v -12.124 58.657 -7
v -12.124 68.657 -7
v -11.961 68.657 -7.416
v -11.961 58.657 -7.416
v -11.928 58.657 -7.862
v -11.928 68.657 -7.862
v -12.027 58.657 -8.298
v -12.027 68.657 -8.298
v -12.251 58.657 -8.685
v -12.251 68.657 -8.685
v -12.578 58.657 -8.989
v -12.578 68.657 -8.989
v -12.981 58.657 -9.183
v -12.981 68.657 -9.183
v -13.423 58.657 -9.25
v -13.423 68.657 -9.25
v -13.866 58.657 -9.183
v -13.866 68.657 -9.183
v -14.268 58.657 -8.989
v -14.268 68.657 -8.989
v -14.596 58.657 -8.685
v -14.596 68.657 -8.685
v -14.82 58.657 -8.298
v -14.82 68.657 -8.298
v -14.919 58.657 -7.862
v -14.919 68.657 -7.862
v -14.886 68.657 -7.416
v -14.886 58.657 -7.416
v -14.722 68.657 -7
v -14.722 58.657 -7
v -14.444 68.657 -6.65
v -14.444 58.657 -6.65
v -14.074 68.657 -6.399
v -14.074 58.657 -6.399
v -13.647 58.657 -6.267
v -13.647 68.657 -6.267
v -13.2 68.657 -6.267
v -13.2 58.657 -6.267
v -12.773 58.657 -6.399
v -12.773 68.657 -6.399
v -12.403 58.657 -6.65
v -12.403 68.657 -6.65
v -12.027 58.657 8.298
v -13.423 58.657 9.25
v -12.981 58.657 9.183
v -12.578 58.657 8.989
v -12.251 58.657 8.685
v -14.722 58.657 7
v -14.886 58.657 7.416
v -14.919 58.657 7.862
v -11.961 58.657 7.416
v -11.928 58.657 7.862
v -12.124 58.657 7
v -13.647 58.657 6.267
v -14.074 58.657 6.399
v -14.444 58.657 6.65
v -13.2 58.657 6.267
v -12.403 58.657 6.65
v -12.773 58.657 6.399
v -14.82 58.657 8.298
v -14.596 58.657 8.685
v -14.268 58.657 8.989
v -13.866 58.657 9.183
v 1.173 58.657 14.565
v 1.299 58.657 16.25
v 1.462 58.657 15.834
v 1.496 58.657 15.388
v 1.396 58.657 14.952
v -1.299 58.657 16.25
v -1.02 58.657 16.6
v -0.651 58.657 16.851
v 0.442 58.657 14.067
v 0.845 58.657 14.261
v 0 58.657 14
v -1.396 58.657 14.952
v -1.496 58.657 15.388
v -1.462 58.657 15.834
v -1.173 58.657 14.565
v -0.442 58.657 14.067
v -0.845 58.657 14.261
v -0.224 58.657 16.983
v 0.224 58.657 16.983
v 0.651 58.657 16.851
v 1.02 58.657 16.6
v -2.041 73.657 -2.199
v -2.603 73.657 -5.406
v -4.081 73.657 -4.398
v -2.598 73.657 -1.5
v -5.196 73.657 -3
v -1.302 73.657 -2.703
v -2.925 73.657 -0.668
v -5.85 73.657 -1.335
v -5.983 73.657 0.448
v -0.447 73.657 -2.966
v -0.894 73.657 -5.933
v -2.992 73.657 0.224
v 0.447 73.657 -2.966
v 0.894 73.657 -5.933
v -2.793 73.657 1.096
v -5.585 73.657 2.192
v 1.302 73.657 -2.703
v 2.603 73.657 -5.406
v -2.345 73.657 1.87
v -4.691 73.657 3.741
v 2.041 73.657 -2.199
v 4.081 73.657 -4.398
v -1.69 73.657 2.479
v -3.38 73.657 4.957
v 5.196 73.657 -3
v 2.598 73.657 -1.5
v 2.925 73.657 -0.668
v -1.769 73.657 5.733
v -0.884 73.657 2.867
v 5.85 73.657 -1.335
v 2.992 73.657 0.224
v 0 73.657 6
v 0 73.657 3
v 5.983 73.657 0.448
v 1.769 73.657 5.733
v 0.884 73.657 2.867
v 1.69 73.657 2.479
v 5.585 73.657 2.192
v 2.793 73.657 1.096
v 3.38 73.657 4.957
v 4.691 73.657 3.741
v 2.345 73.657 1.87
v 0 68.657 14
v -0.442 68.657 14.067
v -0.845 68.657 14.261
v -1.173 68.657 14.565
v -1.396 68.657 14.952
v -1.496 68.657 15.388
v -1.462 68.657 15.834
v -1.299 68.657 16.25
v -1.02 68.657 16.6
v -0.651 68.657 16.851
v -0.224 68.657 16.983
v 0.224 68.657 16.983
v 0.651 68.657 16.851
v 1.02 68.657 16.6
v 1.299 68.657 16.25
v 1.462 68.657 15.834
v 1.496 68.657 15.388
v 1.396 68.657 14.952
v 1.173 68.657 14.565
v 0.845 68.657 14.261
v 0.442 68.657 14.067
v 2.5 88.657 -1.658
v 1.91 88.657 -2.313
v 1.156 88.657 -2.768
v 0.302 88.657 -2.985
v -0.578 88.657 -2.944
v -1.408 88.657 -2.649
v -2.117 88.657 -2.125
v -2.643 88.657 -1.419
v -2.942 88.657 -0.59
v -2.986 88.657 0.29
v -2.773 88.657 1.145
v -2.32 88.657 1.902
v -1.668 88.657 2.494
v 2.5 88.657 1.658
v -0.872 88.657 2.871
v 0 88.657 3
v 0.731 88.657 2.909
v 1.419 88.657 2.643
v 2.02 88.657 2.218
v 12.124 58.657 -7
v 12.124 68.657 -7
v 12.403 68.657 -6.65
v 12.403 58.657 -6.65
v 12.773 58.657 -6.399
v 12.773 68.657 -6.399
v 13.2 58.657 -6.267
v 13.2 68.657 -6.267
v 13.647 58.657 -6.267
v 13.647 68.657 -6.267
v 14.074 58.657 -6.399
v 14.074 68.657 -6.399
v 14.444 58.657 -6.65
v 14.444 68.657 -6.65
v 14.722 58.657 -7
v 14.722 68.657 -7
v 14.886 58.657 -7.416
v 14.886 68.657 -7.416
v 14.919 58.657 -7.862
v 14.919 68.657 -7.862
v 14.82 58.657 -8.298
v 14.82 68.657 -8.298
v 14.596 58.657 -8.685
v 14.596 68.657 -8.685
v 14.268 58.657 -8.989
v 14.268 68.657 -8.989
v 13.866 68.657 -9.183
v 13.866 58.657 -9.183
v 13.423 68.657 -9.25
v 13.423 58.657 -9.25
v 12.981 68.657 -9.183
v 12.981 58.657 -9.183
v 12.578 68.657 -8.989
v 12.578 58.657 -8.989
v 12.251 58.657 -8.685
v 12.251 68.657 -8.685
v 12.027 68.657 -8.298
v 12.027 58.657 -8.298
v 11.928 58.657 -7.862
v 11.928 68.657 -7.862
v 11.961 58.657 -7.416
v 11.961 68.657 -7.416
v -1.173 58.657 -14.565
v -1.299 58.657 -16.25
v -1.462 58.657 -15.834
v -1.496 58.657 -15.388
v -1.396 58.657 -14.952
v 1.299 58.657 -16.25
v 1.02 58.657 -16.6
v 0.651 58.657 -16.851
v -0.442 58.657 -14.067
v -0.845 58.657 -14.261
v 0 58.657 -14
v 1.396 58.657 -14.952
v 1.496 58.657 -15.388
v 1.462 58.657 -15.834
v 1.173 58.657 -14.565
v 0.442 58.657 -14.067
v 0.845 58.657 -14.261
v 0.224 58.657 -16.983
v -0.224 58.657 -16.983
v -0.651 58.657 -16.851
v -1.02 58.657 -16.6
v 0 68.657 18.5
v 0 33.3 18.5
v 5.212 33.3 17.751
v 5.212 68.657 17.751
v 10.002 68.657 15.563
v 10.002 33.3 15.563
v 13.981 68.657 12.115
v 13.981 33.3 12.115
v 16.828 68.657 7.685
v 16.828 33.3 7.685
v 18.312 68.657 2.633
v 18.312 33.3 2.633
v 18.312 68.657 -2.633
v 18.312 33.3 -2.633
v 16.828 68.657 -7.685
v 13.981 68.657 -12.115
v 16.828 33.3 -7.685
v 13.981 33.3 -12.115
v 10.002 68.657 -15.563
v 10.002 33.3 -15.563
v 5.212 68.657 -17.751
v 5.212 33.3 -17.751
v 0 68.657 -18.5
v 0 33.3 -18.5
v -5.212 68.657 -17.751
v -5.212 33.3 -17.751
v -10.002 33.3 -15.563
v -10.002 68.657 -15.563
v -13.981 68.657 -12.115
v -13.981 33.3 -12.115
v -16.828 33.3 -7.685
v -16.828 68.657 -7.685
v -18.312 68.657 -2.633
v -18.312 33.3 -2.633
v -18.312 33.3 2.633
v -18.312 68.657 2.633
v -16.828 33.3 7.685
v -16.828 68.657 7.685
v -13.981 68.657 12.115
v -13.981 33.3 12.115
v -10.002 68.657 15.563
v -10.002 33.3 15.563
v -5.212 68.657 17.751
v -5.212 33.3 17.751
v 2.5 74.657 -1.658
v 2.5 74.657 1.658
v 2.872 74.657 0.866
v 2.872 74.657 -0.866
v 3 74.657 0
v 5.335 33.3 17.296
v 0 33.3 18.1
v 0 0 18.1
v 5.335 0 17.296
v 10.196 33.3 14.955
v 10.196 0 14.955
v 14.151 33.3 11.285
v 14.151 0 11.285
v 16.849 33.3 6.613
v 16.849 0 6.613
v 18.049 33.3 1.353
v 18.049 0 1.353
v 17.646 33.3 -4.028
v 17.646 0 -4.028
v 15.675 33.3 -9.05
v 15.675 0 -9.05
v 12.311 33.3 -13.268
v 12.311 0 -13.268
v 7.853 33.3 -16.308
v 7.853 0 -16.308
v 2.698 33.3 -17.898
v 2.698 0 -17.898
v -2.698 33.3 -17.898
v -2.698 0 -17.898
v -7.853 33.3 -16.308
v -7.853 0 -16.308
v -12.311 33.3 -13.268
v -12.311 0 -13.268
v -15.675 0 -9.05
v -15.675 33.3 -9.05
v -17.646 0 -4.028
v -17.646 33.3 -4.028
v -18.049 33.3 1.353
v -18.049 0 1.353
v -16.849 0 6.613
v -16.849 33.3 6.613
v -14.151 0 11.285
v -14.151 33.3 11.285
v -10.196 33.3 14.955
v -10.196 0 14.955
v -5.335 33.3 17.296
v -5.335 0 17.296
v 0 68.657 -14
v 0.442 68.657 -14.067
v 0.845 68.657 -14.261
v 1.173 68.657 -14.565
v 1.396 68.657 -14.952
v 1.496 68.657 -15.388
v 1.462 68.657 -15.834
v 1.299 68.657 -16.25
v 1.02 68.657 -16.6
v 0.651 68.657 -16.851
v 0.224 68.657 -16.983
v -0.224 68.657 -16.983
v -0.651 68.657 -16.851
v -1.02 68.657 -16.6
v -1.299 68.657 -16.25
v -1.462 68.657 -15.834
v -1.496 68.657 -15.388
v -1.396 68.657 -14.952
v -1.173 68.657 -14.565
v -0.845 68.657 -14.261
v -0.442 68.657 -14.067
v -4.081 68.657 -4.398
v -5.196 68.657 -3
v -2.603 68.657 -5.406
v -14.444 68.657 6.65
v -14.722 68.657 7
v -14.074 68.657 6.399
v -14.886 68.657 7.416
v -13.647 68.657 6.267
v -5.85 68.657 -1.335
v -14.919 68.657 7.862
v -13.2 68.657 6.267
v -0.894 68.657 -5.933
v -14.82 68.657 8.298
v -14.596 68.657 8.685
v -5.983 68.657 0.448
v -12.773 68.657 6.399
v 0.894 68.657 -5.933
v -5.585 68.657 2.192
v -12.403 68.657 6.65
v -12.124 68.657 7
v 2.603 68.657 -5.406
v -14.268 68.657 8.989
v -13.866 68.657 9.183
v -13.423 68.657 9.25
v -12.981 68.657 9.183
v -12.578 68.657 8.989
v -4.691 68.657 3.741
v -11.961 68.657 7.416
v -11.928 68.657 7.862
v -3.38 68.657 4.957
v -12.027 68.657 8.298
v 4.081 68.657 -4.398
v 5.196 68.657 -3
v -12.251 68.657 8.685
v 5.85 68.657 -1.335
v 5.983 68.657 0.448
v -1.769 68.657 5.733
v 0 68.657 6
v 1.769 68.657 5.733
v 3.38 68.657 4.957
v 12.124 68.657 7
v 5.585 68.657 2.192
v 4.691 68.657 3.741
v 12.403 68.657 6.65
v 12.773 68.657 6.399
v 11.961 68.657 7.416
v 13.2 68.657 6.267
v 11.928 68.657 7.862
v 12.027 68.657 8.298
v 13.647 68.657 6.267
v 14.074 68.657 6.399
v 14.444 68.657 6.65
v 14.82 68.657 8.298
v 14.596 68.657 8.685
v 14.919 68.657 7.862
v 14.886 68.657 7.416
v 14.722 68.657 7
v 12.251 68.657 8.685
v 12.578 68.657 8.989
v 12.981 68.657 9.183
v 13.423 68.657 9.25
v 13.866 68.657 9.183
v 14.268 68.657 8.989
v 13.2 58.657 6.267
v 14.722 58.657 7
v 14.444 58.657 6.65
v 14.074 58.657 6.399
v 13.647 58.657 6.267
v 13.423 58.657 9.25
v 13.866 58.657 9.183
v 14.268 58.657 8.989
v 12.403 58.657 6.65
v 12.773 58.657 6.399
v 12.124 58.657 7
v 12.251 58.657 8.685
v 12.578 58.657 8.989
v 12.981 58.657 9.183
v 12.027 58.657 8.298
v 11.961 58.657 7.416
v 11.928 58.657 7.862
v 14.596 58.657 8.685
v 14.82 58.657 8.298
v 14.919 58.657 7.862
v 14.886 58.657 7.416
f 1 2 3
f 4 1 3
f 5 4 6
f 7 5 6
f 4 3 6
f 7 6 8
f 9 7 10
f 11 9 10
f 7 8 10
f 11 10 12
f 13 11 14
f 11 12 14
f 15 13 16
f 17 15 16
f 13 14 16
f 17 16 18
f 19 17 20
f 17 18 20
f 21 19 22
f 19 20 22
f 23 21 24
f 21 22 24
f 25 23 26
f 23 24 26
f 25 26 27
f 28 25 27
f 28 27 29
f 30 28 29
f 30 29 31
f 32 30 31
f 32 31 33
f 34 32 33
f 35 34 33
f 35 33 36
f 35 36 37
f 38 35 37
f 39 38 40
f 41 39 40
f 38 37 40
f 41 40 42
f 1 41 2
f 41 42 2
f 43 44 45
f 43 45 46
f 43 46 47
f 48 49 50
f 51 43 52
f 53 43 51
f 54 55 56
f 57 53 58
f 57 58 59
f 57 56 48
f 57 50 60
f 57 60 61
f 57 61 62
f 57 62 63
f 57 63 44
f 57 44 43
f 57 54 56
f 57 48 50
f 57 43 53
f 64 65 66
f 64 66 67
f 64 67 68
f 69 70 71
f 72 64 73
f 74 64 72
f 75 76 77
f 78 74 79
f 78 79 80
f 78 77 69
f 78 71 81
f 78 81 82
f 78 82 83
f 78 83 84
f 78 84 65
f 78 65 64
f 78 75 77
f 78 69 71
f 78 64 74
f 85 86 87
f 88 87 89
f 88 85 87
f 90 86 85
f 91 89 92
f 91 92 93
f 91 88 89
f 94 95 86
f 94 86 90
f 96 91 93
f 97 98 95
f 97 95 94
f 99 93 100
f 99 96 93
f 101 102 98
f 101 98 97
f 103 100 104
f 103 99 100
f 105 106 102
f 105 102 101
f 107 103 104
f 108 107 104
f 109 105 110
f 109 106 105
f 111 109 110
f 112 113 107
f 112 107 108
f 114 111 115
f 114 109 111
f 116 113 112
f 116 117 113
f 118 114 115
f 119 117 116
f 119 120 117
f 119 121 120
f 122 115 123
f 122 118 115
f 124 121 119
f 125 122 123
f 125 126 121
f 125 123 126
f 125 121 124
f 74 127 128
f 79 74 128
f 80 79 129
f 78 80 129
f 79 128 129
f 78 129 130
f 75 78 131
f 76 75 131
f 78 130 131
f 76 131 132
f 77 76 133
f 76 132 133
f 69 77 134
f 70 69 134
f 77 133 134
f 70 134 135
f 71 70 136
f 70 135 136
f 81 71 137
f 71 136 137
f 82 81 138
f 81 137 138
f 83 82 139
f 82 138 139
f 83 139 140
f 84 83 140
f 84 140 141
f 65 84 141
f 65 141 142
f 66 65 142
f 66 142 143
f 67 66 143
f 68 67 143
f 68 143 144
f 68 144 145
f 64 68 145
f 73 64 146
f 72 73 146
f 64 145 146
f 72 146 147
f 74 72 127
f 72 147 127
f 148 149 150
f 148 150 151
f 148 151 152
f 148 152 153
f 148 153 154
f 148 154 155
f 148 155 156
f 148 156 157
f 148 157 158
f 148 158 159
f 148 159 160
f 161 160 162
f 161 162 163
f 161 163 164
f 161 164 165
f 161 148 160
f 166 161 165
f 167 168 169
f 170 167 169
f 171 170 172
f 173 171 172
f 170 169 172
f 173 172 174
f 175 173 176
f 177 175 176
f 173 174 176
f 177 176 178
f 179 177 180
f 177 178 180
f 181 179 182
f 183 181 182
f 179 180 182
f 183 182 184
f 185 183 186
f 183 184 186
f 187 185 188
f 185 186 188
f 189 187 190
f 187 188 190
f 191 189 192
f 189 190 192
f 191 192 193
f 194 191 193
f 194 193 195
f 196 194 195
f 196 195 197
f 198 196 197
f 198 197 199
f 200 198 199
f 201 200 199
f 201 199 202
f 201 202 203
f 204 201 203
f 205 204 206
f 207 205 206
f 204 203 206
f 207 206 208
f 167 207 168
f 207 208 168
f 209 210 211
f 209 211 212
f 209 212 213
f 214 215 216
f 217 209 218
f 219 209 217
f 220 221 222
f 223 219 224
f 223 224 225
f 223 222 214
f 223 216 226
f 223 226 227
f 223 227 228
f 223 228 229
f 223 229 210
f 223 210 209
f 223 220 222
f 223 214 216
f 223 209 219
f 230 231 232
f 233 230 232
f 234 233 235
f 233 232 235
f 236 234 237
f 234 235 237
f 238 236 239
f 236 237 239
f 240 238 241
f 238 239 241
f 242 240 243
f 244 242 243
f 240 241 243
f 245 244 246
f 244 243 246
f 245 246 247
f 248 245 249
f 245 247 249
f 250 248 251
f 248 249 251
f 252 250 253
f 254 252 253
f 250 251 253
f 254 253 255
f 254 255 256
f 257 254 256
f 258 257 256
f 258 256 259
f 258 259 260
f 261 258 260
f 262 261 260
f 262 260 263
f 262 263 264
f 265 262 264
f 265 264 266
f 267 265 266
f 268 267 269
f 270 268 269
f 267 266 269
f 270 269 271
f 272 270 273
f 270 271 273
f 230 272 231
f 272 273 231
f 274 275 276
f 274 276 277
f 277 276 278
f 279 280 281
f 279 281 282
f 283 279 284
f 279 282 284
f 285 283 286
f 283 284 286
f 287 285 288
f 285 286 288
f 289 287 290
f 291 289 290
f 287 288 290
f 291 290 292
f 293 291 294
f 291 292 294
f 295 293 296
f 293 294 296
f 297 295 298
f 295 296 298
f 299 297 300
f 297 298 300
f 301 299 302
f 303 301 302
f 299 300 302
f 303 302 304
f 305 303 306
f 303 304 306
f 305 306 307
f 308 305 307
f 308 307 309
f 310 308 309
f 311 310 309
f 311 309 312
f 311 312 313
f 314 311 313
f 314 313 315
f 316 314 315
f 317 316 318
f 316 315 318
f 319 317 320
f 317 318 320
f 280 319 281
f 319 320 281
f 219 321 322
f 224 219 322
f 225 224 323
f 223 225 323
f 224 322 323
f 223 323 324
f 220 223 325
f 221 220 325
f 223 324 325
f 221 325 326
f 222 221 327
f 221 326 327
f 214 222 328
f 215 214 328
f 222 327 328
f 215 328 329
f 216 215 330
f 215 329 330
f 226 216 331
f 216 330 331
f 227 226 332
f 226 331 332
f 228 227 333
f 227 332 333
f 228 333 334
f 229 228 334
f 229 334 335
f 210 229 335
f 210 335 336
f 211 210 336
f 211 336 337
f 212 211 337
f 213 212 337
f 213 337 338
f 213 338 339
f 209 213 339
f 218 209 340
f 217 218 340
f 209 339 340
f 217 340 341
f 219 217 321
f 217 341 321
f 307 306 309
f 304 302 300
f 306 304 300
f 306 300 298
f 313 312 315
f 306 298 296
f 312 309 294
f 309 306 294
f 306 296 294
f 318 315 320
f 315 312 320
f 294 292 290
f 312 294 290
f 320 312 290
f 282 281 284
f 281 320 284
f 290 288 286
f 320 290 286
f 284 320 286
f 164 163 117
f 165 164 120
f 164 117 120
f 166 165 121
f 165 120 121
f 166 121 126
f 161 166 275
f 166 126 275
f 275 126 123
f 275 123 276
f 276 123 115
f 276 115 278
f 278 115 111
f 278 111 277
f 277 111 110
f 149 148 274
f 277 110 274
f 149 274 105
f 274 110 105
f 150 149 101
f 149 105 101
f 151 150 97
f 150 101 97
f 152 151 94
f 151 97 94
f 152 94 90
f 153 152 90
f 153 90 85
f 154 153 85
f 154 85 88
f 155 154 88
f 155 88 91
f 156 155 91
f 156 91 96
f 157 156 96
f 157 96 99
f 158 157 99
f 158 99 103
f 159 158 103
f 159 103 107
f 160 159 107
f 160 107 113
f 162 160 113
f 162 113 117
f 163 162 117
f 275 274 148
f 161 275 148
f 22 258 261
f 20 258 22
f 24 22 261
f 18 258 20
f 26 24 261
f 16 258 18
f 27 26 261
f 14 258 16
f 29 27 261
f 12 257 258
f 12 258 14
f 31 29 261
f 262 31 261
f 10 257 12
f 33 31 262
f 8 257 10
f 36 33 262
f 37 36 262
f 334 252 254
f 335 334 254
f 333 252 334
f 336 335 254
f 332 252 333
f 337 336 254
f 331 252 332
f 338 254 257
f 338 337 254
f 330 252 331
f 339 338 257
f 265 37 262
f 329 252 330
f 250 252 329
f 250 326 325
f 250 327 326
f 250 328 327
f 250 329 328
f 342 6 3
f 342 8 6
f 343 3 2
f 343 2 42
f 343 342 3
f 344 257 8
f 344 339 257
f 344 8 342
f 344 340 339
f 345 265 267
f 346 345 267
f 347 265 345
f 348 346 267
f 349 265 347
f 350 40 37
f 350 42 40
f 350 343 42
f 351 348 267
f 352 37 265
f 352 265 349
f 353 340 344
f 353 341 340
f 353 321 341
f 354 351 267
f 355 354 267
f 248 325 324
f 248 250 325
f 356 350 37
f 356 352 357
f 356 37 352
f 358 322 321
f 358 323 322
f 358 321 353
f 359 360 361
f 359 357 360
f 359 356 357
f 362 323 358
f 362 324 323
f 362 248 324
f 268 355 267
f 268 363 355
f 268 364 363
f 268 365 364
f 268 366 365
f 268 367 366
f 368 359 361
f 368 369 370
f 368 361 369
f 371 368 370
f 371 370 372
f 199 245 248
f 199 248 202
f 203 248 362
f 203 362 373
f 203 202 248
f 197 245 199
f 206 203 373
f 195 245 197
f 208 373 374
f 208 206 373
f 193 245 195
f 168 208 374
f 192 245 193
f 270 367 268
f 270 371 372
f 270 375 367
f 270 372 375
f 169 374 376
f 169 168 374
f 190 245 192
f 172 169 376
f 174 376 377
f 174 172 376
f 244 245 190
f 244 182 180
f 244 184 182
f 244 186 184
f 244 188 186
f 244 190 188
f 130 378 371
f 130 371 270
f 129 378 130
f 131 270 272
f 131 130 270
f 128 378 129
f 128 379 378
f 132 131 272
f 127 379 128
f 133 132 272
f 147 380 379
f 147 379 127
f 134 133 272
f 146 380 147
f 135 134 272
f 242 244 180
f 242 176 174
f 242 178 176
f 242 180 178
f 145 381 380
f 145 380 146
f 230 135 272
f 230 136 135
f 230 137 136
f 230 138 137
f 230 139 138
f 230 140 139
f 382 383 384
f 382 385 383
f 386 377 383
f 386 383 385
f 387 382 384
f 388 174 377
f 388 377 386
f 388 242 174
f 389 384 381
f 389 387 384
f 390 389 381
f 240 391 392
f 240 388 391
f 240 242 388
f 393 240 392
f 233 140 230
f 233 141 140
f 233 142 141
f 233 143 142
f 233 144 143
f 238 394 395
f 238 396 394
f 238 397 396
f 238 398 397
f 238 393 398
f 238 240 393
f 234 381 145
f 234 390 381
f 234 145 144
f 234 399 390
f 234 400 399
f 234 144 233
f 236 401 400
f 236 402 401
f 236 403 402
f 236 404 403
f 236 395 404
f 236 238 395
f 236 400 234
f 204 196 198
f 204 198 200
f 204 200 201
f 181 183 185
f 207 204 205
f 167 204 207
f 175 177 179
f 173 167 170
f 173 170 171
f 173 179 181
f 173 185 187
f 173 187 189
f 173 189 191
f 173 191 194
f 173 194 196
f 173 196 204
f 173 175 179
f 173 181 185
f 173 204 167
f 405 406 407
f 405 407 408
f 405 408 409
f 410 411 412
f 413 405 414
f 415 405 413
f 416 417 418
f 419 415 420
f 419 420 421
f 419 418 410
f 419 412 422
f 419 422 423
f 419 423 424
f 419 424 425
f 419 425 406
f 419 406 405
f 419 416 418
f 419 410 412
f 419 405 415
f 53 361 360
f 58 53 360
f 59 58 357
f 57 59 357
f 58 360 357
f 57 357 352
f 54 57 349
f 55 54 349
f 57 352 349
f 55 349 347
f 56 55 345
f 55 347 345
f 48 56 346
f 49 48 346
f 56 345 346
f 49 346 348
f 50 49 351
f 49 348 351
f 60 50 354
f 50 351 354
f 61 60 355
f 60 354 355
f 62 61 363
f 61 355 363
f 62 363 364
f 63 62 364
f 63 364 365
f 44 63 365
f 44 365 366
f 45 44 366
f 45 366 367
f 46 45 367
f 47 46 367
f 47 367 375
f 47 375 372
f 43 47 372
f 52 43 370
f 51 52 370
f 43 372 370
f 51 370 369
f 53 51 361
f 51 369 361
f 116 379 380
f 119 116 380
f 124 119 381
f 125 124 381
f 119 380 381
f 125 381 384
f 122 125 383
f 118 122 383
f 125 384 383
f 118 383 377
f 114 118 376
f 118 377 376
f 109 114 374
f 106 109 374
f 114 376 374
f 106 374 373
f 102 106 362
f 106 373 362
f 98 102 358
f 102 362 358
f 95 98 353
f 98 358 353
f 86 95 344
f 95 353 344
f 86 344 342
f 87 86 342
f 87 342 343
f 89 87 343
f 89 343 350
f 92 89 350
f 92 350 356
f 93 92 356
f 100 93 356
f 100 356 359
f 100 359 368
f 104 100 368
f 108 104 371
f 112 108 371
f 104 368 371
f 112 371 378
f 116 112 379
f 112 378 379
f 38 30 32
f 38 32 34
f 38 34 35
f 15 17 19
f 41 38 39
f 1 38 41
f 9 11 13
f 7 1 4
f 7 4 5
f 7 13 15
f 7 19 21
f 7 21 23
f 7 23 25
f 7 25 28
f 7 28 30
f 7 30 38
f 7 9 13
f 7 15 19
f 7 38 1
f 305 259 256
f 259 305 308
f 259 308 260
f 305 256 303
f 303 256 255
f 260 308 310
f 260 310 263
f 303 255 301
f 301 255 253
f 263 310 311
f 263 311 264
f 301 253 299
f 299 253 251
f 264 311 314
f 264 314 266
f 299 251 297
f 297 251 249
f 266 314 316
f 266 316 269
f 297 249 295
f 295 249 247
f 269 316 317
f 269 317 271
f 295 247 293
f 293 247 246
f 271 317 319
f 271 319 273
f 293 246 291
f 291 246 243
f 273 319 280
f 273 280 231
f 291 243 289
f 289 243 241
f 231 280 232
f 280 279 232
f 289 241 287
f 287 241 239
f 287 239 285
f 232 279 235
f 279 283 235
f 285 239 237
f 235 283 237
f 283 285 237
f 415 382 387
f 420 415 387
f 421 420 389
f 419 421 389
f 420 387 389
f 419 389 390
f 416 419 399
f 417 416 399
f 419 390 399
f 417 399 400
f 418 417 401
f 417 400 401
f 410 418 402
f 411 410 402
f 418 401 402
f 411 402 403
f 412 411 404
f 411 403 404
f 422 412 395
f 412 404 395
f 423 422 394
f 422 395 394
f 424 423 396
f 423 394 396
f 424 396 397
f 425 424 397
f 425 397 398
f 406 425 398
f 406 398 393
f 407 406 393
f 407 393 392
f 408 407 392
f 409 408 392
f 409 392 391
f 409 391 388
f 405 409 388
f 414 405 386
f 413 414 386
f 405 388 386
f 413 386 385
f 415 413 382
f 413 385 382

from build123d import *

# Parameters (mm, degrees)
SKETCH1_R               = 18.1
BOSS_EXTRUDE1_DEPTH     = 33.3
SKETCH2_R               = 18.5
BOSS_EXTRUDE2_DEPTH     = 35.3568
SKETCH3_R               = 6
BOSS_EXTRUDE3_DEPTH     = 5
SKETCH4_R               = 3
BOSS_EXTRUDE4_DEPTH     = 15
CUT_EXTRUDE1_DEPTH      = 93.436617129
CUT_EXTRUDE1_DEPTH_BACK = 93.436617129
SKETCH5_W               = 0.5
SKETCH5_H               = 14
SKETCH6_R               = 1.5
CUT_EXTRUDE2_DEPTH      = 10
CIRPATTERN1_COUNT       = 6


with BuildPart() as part:
    # Sketch1 → Boss-Extrude1 (new body)
    with BuildSketch(Plane(origin=(0, 0, 0), x_dir=(1, 0, 0), z_dir=(0, 1, 0))):
        with Locations(Location((0, 0, 0), (0, 0, 270))):
            Circle(SKETCH1_R)
    extrude(amount=BOSS_EXTRUDE1_DEPTH)

    # Sketch2 → Boss-Extrude2 (add)
    with BuildSketch(Plane(origin=(0, 33.3, 0), x_dir=(1, 0, 0), z_dir=(0, 1, 0))):
        with Locations(Location((0, 0, 0), (0, 0, 270))):
            Circle(SKETCH2_R)
    extrude(amount=BOSS_EXTRUDE2_DEPTH)

    # Sketch3 → Boss-Extrude3 (add)
    with BuildSketch(Plane(origin=(0, 68.6568, 0), x_dir=(1, 0, 0), z_dir=(0, 1, 0))):
        with Locations(Location((0, 0, 0), (0, 0, 270))):
            Circle(SKETCH3_R)
    extrude(amount=BOSS_EXTRUDE3_DEPTH)

    # Sketch4 → Boss-Extrude4 (add)
    with BuildSketch(Plane(origin=(0, 73.6568, 0), x_dir=(1, 0, 0), z_dir=(0, 1, 0))):
        with Locations(Location((0, 0, 0), (0, 0, 270))):
            Circle(SKETCH4_R)
    extrude(amount=BOSS_EXTRUDE4_DEPTH)

    # Sketch5 → Cut-Extrude1 (cut, two sides: drawn at the far end of the back side and taken through both)
    with BuildSketch(Plane.XY.offset(-CUT_EXTRUDE1_DEPTH_BACK)):
        with Locations((2.75, 81.6568)):
            Rectangle(SKETCH5_W, SKETCH5_H)
    extrude(amount=CUT_EXTRUDE1_DEPTH + CUT_EXTRUDE1_DEPTH_BACK, mode=Mode.SUBTRACT)

    # Sketch6 → Cut-Extrude2 (cut)
    with BuildSketch(Plane(origin=(0, 68.6568, 0), x_dir=(1, 0, 0), z_dir=(0, 1, 0))):
        with Locations(Location((0, 15.5, 0), (0, 0, 270))):
            Circle(SKETCH6_R)
    cut_extrude2 = extrude(amount=-CUT_EXTRUDE2_DEPTH, mode=Mode.SUBTRACT)

    # CirPattern1: Cut-Extrude2 ×6 about axis
    cirpattern1_axis = Axis((0, 0, 0), (0, 1, 0))
    for i in range(1, CIRPATTERN1_COUNT):
        add(cut_extrude2.rotate(cirpattern1_axis, i * 360 / CIRPATTERN1_COUNT), mode=Mode.SUBTRACT)


solid = part.part
